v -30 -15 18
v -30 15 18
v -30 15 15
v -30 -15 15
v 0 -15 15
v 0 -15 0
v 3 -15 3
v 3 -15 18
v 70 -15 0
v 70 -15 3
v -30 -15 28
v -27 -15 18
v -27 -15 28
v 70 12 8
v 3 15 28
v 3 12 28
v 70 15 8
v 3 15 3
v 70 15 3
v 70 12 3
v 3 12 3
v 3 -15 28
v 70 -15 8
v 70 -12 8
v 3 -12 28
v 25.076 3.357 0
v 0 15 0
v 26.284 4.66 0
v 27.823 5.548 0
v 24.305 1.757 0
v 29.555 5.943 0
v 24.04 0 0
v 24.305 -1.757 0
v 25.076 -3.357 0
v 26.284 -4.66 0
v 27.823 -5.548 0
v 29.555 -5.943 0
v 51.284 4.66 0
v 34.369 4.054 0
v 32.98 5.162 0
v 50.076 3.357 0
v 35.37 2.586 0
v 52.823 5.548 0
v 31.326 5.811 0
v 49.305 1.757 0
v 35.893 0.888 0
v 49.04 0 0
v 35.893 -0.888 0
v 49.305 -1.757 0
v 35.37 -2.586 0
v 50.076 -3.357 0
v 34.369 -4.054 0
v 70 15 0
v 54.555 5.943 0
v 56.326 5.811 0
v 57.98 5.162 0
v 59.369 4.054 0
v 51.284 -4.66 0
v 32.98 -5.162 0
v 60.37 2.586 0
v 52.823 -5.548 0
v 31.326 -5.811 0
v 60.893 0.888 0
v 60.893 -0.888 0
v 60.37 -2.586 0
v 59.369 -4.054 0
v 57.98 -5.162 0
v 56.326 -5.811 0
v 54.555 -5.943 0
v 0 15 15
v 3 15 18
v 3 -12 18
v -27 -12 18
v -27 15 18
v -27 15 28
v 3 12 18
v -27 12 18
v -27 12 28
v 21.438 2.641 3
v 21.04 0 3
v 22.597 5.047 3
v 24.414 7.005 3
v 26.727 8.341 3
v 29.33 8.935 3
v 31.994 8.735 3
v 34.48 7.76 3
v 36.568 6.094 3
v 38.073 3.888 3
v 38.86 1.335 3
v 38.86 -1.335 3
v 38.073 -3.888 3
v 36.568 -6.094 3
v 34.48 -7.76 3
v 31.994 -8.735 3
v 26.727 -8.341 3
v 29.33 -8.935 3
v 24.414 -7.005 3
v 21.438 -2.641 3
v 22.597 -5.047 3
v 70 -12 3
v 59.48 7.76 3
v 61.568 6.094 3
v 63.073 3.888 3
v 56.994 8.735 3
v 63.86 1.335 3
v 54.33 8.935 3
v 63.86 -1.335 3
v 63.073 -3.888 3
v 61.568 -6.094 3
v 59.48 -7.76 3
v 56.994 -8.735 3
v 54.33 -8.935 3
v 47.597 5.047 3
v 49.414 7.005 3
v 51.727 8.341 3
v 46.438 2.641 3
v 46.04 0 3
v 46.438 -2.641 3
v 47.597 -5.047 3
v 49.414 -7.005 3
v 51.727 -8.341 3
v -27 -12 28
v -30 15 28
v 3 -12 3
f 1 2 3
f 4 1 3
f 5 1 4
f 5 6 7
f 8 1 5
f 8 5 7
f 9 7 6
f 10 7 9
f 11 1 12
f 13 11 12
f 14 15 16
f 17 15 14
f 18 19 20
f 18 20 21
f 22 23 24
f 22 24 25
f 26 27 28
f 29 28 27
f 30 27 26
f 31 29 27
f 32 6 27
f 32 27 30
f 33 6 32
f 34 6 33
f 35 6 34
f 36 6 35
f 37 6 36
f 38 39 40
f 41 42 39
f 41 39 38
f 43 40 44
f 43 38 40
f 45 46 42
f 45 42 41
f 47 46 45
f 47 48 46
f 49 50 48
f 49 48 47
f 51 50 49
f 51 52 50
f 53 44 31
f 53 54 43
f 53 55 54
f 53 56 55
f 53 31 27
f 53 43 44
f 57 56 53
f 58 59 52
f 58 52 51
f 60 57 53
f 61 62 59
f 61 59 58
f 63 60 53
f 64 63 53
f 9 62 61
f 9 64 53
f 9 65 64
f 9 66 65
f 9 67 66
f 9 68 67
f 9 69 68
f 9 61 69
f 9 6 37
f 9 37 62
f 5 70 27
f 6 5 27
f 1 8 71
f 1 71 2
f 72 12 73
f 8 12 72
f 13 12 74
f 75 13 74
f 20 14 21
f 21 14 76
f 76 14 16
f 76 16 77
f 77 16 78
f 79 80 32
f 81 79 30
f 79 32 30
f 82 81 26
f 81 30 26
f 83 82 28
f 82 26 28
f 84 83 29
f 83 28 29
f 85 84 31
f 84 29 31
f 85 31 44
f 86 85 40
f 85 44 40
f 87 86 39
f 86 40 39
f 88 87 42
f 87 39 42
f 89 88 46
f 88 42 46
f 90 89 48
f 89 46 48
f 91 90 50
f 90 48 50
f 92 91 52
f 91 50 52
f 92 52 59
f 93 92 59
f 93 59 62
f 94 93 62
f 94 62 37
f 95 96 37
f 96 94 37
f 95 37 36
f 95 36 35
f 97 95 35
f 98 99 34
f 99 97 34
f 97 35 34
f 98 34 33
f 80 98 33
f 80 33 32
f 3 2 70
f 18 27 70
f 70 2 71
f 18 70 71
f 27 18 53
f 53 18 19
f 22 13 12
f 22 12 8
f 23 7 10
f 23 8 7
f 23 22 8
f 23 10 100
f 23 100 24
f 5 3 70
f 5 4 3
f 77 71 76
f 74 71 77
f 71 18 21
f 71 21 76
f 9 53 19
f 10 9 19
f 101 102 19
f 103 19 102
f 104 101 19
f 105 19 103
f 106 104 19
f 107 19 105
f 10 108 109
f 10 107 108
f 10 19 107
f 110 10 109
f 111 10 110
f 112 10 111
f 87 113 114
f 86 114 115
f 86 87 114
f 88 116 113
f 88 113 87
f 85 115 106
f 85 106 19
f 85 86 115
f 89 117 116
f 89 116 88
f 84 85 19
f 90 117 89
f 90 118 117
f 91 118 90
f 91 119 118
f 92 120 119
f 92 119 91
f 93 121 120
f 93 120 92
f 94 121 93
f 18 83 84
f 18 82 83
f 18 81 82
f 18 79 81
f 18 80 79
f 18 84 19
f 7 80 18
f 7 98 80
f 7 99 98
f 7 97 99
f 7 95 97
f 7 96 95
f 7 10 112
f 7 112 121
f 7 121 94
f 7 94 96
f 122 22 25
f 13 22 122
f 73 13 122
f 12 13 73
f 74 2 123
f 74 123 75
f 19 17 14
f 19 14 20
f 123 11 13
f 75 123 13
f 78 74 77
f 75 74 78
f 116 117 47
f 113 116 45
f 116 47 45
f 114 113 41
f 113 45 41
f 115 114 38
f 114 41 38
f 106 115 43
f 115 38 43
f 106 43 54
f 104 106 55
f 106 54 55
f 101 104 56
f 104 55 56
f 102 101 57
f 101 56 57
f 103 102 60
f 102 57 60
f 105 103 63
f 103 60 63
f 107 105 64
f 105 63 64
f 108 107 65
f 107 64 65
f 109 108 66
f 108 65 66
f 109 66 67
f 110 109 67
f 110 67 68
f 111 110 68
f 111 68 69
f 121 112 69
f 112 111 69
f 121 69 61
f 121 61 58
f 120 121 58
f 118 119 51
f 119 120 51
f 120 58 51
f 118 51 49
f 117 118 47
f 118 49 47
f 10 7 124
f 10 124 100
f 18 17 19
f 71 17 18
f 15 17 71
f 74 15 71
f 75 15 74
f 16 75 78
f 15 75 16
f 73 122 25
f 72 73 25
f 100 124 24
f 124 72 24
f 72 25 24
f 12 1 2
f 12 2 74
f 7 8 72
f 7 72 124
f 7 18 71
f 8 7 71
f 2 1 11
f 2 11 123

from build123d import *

# Parameters (mm, degrees)
F1_DEPTH       = 15
F3_D           = 8.8
F3_CSINK_D     = 17.92
F3_CSINK_ANGLE = 90
F4_W           = 3
F4_H           = 30
F5_DEPTH       = 10
F8_DEPTH       = 3
F9_DEPTH       = 3


with BuildPart() as f1:
    # F0 (on Front) → F1 (new body, symmetric)
    with BuildSketch(Plane.XZ):
        Polygon((0, 3), (0, 0), (70, 0), (70, 3), (3, 3), (3, 18), (-30, 18), (-30, 15), (0, 15), align=None)
    extrude(amount=F1_DEPTH, both=True)

    # F3 (through all)
    with Locations(Plane.XY.offset(3)):
        with Locations((55, 0), (30, 0)):
            CounterSinkHole(F3_D / 2, F3_CSINK_D / 2, counter_sink_angle=F3_CSINK_ANGLE)


with BuildPart() as f5:
    # F4 (on face) → F5 (new body)
    with BuildSketch(Plane.XY.offset(18)):
        with Locations((-28.5, 0)):
            Rectangle(F4_W, F4_H)
    extrude(amount=F5_DEPTH)


with BuildPart() as f8:
    # F6 (on face) → F8 (new body)
    with BuildSketch(Plane.XZ.offset(15)):
        Polygon((3, 3), (70, 3), (70, 8), (3, 28), (-27, 28), (-27, 18), (3, 18), align=None)
    extrude(amount=-F8_DEPTH)


with BuildPart() as f9:
    # F7 (on face) → F9 (new body)
    with BuildSketch(Plane(origin=(0, 15, 0), x_dir=(-1, 0, 0), z_dir=(0, 1, 0))):
        Polygon((-3, 18), (27, 18), (27, 28), (-3, 28), (-70, 8), (-70, 3), (-3, 3), align=None)
    extrude(amount=-F9_DEPTH)


solid = Compound([f1.part, f5.part, f8.part, f9.part])
